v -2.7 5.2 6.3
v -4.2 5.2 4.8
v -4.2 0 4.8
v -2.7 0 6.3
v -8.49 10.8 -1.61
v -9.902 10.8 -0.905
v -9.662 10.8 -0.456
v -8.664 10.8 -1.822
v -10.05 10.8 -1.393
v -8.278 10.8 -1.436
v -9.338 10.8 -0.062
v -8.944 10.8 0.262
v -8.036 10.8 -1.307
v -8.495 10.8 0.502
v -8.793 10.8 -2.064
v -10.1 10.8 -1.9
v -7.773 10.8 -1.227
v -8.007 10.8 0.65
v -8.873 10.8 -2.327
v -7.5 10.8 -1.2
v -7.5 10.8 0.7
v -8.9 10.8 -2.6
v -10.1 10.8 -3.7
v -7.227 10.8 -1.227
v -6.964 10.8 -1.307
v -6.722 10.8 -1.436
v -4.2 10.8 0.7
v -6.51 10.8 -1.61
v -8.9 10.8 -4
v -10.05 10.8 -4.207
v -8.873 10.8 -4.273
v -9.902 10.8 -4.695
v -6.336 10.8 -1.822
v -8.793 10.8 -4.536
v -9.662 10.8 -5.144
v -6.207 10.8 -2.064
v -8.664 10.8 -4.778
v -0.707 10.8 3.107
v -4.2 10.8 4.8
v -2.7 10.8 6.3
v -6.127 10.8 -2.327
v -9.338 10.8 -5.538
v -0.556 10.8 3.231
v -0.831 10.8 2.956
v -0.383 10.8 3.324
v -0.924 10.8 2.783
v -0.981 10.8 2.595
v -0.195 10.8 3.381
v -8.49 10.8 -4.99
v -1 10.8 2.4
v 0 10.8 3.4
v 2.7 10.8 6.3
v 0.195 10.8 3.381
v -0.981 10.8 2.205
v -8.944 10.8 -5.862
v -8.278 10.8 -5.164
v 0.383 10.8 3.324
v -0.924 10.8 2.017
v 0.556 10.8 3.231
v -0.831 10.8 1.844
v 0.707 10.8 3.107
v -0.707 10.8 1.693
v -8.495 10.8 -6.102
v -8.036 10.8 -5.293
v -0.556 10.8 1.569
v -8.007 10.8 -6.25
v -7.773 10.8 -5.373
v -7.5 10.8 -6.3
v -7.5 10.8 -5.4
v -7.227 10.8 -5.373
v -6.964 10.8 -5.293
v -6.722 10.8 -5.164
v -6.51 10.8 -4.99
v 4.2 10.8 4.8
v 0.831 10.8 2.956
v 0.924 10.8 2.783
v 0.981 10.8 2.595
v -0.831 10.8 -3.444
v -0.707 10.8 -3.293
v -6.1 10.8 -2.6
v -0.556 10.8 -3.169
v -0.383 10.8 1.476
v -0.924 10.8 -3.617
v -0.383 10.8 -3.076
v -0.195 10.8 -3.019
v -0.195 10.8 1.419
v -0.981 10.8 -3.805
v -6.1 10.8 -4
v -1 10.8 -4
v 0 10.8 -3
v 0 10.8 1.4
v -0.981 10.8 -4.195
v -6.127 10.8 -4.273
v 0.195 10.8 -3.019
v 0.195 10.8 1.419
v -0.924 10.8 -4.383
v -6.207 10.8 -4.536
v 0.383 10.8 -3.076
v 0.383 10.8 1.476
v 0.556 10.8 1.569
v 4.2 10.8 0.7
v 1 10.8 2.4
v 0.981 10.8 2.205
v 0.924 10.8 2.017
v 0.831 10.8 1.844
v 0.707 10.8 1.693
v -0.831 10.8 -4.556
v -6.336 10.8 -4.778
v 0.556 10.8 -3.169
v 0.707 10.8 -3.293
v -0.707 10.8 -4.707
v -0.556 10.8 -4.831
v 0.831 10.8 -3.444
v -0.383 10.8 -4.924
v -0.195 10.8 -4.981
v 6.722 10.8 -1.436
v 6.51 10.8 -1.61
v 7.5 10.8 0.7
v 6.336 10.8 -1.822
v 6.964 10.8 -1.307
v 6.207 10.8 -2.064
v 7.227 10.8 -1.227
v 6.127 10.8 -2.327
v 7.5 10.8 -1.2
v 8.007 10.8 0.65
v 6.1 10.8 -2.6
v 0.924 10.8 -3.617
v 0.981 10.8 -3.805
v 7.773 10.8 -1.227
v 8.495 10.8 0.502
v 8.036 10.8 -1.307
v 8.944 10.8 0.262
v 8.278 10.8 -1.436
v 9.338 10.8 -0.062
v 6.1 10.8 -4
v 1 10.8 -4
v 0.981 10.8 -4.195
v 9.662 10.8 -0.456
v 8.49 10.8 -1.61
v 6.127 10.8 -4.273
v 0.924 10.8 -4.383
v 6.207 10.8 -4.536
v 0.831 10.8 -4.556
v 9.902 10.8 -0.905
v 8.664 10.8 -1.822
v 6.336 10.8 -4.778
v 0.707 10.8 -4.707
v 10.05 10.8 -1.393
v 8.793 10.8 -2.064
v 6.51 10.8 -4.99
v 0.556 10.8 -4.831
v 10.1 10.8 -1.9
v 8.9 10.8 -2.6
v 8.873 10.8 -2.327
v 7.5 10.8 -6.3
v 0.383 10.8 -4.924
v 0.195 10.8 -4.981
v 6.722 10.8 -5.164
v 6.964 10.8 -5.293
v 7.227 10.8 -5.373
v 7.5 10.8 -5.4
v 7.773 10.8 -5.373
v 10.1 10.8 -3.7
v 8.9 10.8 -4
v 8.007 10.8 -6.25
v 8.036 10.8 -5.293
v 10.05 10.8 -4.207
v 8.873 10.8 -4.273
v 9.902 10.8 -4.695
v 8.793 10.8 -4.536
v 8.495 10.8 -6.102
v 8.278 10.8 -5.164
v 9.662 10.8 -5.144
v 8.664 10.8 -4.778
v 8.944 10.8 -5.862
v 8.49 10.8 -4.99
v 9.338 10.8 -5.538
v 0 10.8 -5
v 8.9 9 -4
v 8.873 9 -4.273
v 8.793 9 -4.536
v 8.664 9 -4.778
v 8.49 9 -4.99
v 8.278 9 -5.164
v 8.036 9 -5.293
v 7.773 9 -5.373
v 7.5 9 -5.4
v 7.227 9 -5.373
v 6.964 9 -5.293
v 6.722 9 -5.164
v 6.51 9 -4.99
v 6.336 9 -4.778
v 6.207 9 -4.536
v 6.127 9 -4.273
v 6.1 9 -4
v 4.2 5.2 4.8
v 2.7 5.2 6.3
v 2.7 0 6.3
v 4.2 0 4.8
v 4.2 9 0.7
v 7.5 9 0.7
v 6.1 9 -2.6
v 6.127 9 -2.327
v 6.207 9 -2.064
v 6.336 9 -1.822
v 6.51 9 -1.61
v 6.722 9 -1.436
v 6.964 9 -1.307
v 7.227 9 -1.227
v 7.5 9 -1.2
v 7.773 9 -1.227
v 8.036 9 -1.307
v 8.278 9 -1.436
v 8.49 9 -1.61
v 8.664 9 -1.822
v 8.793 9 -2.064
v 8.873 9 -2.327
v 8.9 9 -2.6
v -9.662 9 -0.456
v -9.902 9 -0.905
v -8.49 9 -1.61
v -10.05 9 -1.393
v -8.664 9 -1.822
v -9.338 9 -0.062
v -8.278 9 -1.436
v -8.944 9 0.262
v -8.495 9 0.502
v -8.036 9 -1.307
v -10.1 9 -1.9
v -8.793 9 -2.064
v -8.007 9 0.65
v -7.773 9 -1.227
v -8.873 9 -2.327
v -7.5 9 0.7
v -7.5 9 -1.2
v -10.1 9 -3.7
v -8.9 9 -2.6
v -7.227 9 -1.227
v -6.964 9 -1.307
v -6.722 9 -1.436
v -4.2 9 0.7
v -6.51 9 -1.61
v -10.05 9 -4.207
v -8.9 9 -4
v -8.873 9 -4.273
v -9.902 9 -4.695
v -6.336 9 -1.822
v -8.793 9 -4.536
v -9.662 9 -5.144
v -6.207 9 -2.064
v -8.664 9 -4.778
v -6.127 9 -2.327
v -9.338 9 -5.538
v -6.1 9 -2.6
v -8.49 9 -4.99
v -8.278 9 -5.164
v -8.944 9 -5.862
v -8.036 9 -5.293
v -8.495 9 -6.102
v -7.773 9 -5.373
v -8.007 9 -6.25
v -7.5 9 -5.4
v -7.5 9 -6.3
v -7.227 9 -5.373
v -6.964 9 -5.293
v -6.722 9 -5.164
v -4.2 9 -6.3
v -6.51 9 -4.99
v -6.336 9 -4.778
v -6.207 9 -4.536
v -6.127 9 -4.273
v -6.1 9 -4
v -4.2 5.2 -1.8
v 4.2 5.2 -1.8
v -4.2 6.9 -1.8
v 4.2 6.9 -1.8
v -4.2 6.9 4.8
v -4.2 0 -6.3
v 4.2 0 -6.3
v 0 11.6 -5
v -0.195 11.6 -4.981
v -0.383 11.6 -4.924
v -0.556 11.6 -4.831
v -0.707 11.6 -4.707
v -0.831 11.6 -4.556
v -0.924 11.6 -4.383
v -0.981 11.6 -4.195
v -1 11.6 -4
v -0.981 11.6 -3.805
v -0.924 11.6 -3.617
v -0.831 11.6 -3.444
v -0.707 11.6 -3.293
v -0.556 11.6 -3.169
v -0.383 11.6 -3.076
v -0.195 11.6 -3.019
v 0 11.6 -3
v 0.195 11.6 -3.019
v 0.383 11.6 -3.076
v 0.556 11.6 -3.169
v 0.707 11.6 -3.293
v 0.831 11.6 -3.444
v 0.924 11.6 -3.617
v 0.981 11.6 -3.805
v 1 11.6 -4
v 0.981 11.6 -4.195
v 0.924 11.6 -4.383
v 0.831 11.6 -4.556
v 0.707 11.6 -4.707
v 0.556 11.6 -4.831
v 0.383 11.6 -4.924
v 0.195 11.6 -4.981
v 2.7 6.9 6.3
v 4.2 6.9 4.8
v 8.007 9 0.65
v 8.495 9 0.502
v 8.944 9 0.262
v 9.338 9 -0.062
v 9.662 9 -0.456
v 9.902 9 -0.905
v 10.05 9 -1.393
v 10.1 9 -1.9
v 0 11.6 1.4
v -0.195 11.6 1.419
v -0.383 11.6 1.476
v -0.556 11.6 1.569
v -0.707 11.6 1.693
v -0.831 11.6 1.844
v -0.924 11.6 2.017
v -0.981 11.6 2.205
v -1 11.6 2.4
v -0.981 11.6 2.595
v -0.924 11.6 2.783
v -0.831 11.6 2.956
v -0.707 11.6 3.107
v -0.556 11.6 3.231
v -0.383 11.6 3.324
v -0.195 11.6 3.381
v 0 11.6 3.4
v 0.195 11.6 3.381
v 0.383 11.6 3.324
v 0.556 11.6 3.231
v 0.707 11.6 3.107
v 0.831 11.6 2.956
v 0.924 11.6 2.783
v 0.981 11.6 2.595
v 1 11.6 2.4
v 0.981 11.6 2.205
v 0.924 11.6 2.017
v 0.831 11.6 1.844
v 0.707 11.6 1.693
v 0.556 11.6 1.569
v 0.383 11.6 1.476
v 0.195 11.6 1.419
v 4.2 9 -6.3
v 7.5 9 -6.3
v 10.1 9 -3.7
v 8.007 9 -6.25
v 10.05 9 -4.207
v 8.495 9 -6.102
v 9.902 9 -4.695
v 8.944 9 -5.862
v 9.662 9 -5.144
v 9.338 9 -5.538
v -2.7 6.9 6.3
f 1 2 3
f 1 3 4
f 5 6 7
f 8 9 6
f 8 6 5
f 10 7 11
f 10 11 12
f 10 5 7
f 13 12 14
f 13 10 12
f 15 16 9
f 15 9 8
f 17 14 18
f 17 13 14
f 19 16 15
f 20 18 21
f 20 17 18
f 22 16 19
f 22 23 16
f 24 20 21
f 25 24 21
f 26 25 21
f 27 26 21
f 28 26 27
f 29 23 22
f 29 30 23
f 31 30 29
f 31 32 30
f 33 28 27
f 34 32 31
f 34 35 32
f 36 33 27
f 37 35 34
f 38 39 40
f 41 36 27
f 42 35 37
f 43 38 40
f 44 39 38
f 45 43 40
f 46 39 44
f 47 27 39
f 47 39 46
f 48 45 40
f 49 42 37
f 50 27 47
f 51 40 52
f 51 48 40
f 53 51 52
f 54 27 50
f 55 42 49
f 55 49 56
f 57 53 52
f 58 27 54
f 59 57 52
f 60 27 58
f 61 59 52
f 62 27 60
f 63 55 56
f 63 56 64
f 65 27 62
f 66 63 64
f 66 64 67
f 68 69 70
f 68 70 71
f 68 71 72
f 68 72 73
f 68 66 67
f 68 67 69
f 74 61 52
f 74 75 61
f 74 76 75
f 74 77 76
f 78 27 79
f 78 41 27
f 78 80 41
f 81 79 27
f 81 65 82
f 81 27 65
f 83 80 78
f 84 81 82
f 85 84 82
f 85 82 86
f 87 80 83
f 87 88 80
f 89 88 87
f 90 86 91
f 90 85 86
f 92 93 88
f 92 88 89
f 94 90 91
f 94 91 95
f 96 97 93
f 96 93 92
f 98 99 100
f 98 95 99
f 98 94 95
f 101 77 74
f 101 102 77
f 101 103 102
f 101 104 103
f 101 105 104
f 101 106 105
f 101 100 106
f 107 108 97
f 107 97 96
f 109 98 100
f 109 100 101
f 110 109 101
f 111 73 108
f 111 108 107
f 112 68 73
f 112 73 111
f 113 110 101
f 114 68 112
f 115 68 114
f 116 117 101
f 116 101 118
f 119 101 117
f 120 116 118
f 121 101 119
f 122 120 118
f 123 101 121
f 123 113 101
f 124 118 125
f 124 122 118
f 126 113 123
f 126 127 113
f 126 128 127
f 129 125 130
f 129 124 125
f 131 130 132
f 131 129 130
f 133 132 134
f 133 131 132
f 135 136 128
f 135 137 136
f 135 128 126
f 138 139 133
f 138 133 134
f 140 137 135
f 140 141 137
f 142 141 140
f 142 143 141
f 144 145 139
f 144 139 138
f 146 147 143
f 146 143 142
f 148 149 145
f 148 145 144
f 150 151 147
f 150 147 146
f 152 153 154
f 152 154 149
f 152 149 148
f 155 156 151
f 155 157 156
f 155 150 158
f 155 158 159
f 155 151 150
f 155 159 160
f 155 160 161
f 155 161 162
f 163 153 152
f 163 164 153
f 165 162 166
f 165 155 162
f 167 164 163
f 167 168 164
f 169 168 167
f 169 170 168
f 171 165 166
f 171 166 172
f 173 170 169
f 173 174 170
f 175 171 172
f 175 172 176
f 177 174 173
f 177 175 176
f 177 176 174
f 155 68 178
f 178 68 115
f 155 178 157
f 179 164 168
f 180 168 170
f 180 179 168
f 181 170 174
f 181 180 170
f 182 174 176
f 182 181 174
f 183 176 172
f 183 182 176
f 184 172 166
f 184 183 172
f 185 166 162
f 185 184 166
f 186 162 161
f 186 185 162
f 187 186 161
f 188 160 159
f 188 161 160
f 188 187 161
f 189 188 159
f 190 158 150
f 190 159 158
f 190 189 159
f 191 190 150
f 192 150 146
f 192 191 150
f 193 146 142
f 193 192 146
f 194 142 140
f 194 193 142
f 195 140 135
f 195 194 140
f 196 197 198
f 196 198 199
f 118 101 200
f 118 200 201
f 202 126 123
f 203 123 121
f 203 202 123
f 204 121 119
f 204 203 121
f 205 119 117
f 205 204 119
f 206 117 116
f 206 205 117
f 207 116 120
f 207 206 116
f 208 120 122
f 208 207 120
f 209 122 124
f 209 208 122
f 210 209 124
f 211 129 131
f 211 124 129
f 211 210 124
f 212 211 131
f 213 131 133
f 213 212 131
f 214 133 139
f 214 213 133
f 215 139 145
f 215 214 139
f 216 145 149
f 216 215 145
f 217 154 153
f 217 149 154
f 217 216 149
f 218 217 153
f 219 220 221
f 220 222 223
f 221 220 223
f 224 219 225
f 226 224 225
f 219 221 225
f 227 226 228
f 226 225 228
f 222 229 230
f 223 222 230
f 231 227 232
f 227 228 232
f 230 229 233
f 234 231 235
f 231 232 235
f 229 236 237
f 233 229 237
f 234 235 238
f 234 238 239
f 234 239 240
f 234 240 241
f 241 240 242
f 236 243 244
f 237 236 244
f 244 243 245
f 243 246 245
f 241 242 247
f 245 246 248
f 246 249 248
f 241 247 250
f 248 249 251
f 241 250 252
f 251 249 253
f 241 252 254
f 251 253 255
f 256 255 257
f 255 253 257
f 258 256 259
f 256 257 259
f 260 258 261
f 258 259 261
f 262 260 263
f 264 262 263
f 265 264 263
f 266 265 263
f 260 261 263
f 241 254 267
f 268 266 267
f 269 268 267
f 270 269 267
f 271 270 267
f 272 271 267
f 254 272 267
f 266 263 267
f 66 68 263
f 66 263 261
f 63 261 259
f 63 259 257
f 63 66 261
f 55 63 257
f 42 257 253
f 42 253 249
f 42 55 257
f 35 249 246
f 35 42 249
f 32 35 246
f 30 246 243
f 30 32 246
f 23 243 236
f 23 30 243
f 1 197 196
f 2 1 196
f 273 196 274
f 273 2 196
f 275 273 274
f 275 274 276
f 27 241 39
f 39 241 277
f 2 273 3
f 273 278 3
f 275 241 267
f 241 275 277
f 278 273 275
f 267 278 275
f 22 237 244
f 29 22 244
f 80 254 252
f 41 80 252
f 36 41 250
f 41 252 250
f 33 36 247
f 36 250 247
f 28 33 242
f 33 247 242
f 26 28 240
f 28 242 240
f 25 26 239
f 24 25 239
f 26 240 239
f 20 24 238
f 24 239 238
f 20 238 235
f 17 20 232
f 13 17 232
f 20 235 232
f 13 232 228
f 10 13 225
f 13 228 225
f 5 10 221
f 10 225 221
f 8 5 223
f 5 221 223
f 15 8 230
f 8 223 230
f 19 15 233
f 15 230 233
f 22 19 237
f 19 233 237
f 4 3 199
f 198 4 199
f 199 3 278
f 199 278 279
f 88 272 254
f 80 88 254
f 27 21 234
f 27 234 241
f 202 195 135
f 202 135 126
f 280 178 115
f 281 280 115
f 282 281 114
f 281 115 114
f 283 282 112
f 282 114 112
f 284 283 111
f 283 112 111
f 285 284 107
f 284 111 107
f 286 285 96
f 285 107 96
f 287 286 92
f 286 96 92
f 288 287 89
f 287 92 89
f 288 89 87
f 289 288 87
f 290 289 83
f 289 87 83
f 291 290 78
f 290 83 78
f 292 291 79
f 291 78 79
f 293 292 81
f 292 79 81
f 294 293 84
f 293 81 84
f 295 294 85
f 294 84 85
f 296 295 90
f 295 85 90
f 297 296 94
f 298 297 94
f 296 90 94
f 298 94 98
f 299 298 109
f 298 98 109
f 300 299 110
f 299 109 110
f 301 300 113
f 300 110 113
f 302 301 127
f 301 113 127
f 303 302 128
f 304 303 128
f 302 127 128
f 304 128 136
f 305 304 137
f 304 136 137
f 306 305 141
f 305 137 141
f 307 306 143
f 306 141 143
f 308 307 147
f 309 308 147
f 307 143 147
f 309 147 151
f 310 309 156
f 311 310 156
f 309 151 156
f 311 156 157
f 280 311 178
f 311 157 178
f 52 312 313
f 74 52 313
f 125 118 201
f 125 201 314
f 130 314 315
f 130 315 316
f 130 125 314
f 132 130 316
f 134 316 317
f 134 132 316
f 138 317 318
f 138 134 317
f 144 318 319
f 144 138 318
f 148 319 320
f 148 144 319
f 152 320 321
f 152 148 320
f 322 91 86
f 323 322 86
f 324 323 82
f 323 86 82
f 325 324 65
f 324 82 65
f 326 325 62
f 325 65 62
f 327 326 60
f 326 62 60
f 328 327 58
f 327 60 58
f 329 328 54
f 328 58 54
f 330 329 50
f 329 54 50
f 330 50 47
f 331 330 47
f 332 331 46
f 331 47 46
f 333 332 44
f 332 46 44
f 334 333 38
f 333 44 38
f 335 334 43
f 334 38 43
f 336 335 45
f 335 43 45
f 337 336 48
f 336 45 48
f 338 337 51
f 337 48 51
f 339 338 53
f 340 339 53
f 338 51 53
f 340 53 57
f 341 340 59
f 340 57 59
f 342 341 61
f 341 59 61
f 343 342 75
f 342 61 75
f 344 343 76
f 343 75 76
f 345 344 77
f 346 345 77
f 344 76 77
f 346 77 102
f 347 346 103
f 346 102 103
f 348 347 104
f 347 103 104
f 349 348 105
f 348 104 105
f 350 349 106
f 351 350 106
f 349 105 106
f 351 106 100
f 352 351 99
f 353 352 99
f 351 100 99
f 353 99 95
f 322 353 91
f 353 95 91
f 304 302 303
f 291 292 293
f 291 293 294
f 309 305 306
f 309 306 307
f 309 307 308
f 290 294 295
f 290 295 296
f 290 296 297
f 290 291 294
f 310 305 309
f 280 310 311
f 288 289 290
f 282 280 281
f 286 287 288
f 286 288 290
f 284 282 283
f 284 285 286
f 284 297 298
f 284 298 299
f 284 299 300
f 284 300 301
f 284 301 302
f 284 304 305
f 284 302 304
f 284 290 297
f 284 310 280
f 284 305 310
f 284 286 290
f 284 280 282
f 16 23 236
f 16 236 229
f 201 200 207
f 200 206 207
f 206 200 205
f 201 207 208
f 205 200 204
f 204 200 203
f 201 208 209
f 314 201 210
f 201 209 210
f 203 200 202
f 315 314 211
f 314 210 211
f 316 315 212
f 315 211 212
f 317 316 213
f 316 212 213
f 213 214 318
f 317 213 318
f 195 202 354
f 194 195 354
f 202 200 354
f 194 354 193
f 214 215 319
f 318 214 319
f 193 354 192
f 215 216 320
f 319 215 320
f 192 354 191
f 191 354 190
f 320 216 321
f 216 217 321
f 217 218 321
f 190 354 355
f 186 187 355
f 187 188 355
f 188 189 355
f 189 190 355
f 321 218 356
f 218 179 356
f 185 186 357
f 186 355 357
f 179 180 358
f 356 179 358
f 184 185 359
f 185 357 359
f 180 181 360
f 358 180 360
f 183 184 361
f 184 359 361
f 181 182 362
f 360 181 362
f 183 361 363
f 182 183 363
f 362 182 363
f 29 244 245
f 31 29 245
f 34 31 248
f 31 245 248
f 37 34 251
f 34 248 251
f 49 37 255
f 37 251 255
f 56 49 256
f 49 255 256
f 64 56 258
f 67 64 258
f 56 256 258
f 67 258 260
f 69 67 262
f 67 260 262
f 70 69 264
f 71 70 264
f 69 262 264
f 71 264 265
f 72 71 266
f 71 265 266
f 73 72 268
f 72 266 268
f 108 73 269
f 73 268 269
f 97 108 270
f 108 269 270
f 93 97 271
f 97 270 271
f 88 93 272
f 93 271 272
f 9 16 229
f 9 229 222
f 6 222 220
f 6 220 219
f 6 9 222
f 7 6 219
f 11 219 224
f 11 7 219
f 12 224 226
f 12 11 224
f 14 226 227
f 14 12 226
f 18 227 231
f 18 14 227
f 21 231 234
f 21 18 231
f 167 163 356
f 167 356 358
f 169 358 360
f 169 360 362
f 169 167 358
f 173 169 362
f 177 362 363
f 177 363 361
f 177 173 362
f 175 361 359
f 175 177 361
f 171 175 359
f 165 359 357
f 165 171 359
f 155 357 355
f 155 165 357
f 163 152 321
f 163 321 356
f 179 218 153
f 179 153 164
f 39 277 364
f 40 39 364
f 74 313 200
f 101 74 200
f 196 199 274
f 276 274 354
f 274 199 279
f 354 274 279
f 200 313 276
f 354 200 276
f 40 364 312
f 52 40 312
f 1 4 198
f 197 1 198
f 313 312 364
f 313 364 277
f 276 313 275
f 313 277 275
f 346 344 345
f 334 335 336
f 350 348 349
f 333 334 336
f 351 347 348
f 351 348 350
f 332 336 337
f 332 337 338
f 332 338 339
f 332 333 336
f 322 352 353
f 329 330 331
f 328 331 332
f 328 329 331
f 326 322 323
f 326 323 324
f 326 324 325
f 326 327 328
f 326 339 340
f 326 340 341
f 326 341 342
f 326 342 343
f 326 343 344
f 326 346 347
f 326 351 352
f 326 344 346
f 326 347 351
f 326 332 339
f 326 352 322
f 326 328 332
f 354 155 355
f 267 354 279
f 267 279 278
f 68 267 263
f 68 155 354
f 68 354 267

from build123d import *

# Parameters (mm, degrees)
BOSS_EXTRUDE1_DEPTH     = 10.8
BOSS_EXTRUDE2_DEPTH     = 1.8
CUT_EXTRUDE1_DEPTH      = 15.9231364
CUT_EXTRUDE2_DEPTH      = 19.995262567
CUT_EXTRUDE2_DEPTH_BACK = 19.995262567
SKETCH4_W               = 8.1
SKETCH4_H               = 1.7
SKETCH6_R               = 1
BOSS_EXTRUDE3_DEPTH     = 0.8


with BuildPart() as part:
    # Sketch1 → Boss-Extrude1 (new body)
    with BuildSketch(Plane(origin=(0, 0, 0), x_dir=(1, 0, 0), z_dir=(0, 1, 0))):
        Polygon((2.7, -6.3), (4.2, -4.8), (4.2, 6.3), (-4.2, 6.3), (-4.2, -4.8), (-2.7, -6.3), align=None)
    extrude(amount=BOSS_EXTRUDE1_DEPTH)

    # Sketch2 → Boss-Extrude2 (add)
    with BuildSketch(Plane(origin=(0, 10.8, 0), x_dir=(1, 0, 0), z_dir=(0, 1, 0))):
        with BuildLine():
            Line((-7.5, -0.7), (7.5, -0.7))
            ThreePointArc((7.5, -0.7), (9.338477631, 0.061522369), (10.1, 1.9))
            Line((10.1, 1.9), (10.1, 3.7))
            ThreePointArc((10.1, 3.7), (9.338477631, 5.538477631), (7.5, 6.3))
            Line((7.5, 6.3), (-7.5, 6.3))
            ThreePointArc((-7.5, 6.3), (-9.338477631, 5.538477631), (-10.1, 3.7))
            Line((-10.1, 3.7), (-10.1, 1.9))
            ThreePointArc((-10.1, 1.9), (-9.338477631, 0.061522369), (-7.5, -0.7))
        make_face()
    extrude(amount=-BOSS_EXTRUDE2_DEPTH)

    # Sketch3 → Cut-Extrude1 (cut, through all)
    with BuildSketch(Plane.XZ.offset(-9)):
        with BuildLine():
            Line((6.1, -4), (6.1, -2.6))
            ThreePointArc((6.1, -2.6), (7.5, -1.2), (8.9, -2.6))
            Line((8.9, -2.6), (8.9, -4))
            ThreePointArc((8.9, -4), (7.5, -5.4), (6.1, -4))
        make_face()
        with BuildLine():
            Line((-6.1, -4), (-6.1, -2.6))
            ThreePointArc((-6.1, -2.6), (-7.5, -1.2), (-8.9, -2.6))
            Line((-8.9, -2.6), (-8.9, -4))
            ThreePointArc((-8.9, -4), (-7.5, -5.4), (-6.1, -4))
        make_face()
    extrude(amount=-CUT_EXTRUDE1_DEPTH, mode=Mode.SUBTRACT)

    # Sketch4 → Cut-Extrude2 (cut, two sides: drawn at the far end of the back side and taken through both)
    with BuildSketch(Plane(origin=(4.2, 0, 0), x_dir=(0, 0, -1), z_dir=(1, 0, 0)).offset(-CUT_EXTRUDE2_DEPTH_BACK)):
        with Locations((-2.25, 6.05)):
            Rectangle(SKETCH4_W, SKETCH4_H)
    extrude(amount=CUT_EXTRUDE2_DEPTH + CUT_EXTRUDE2_DEPTH_BACK, mode=Mode.SUBTRACT)

    # Sketch6 → Boss-Extrude3 (add)
    with BuildSketch(Plane(origin=(0, 10.8, 0), x_dir=(1, 0, 0), z_dir=(0, 1, 0))):
        with Locations(Location((0, -2.4, 0), (0, 0, 90))):
            Circle(SKETCH6_R)
        with Locations(Location((0, 4, 0), (0, 0, 90))):
            Circle(SKETCH6_R)
    extrude(amount=BOSS_EXTRUDE3_DEPTH)


solid = part.part
